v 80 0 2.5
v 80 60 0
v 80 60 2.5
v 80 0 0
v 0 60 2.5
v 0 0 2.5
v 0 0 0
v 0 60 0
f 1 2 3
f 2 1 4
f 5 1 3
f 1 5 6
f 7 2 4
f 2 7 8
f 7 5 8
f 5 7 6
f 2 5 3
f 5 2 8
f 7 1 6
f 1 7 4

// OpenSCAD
/* Box with print-in-place hinge - step 1: params + base */
part = "assembly"; // [base, lid, pin, assembly]

cadverify_only = "";
module instance(name, part, unit = 1) {
    echo(cadverify_instance = [name, part, unit]);
    if (cadverify_only == "" || cadverify_only == name) children();
}

// ---- parameters (mm) ----
W = 80; D = 60; H = 40;          // body outer, closed
baseH = 30;                      // base height
gapZLid = 0.3;                   // lid-base vertical gap
lidBot = baseH + gapZLid;        // 30.3
lidTop = H;                      // 40
axY = 0; axZ = baseH + gapZLid/2; // hinge axis (0, 30.15)
wallT = 2; floorT = 2.5; lidTopT = 2.5;
pinH = 1.8; boreH = 2.2; outH = 4.0; cbH = 3.2; capH = 2.8;
clrR = 0.4; clrA = 0.4;
divT = 2; divTop = 37.2;

// knuckle X intervals
bx10=-40; bx11=-24; lx10=-23.6; lx11=-7.6;
bx20=-7.2; bx21=7.2; lx20=7.6; lx21=23.6; bx30=24; bx31=40;

// generic prism along X from polygon in (Z,Y) mapped: poly points [z,y]
module prism_x(poly, x0, len) {
    translate([x0, 0, 0]) rotate([0,90,0])
        linear_extrude(height=len) polygon(poly);
}
function diamond(h) = [[-h,0],[0,-h],[h,0],[0,h]];

module knuckle_out(x0, len) {
    // diamond cross-section points [z,y] centered at (axZ, axY)
    p = diamond(outH);
    translate([0, axY, axZ]) prism_x(p, x0, len);
}
module bore_small(x0, len) {
    p = diamond(boreH);
    translate([0, axY, axZ]) prism_x(p, x0, len);
}
module bore_cb(x0, len) {
    p = diamond(cbH);
    translate([0, axY, axZ]) prism_x(p, x0, len);
}

module base_geo() {
    difference() {
        union() {
            // floor + walls
            cube([W, D, floorT], center=false); // placeholder, moved below
        }
        // subtractions added in step 1b
        cube([0.01,0.01,0.01]);
    }
}

// stubs
module lid_geo() { cube([0.01,0.01,0.01]); }
module pin_geo() { cube([0.01,0.01,0.01]); }

if (part=="base") { base_geo(); }
else if (part=="lid") { lid_geo(); }
else if (part=="pin") { pin_geo(); }
else if (part=="assembly") {
    instance("base","base") base_geo();
    instance("lid","lid") lid_geo();
    instance("pin","pin") pin_geo();
}
